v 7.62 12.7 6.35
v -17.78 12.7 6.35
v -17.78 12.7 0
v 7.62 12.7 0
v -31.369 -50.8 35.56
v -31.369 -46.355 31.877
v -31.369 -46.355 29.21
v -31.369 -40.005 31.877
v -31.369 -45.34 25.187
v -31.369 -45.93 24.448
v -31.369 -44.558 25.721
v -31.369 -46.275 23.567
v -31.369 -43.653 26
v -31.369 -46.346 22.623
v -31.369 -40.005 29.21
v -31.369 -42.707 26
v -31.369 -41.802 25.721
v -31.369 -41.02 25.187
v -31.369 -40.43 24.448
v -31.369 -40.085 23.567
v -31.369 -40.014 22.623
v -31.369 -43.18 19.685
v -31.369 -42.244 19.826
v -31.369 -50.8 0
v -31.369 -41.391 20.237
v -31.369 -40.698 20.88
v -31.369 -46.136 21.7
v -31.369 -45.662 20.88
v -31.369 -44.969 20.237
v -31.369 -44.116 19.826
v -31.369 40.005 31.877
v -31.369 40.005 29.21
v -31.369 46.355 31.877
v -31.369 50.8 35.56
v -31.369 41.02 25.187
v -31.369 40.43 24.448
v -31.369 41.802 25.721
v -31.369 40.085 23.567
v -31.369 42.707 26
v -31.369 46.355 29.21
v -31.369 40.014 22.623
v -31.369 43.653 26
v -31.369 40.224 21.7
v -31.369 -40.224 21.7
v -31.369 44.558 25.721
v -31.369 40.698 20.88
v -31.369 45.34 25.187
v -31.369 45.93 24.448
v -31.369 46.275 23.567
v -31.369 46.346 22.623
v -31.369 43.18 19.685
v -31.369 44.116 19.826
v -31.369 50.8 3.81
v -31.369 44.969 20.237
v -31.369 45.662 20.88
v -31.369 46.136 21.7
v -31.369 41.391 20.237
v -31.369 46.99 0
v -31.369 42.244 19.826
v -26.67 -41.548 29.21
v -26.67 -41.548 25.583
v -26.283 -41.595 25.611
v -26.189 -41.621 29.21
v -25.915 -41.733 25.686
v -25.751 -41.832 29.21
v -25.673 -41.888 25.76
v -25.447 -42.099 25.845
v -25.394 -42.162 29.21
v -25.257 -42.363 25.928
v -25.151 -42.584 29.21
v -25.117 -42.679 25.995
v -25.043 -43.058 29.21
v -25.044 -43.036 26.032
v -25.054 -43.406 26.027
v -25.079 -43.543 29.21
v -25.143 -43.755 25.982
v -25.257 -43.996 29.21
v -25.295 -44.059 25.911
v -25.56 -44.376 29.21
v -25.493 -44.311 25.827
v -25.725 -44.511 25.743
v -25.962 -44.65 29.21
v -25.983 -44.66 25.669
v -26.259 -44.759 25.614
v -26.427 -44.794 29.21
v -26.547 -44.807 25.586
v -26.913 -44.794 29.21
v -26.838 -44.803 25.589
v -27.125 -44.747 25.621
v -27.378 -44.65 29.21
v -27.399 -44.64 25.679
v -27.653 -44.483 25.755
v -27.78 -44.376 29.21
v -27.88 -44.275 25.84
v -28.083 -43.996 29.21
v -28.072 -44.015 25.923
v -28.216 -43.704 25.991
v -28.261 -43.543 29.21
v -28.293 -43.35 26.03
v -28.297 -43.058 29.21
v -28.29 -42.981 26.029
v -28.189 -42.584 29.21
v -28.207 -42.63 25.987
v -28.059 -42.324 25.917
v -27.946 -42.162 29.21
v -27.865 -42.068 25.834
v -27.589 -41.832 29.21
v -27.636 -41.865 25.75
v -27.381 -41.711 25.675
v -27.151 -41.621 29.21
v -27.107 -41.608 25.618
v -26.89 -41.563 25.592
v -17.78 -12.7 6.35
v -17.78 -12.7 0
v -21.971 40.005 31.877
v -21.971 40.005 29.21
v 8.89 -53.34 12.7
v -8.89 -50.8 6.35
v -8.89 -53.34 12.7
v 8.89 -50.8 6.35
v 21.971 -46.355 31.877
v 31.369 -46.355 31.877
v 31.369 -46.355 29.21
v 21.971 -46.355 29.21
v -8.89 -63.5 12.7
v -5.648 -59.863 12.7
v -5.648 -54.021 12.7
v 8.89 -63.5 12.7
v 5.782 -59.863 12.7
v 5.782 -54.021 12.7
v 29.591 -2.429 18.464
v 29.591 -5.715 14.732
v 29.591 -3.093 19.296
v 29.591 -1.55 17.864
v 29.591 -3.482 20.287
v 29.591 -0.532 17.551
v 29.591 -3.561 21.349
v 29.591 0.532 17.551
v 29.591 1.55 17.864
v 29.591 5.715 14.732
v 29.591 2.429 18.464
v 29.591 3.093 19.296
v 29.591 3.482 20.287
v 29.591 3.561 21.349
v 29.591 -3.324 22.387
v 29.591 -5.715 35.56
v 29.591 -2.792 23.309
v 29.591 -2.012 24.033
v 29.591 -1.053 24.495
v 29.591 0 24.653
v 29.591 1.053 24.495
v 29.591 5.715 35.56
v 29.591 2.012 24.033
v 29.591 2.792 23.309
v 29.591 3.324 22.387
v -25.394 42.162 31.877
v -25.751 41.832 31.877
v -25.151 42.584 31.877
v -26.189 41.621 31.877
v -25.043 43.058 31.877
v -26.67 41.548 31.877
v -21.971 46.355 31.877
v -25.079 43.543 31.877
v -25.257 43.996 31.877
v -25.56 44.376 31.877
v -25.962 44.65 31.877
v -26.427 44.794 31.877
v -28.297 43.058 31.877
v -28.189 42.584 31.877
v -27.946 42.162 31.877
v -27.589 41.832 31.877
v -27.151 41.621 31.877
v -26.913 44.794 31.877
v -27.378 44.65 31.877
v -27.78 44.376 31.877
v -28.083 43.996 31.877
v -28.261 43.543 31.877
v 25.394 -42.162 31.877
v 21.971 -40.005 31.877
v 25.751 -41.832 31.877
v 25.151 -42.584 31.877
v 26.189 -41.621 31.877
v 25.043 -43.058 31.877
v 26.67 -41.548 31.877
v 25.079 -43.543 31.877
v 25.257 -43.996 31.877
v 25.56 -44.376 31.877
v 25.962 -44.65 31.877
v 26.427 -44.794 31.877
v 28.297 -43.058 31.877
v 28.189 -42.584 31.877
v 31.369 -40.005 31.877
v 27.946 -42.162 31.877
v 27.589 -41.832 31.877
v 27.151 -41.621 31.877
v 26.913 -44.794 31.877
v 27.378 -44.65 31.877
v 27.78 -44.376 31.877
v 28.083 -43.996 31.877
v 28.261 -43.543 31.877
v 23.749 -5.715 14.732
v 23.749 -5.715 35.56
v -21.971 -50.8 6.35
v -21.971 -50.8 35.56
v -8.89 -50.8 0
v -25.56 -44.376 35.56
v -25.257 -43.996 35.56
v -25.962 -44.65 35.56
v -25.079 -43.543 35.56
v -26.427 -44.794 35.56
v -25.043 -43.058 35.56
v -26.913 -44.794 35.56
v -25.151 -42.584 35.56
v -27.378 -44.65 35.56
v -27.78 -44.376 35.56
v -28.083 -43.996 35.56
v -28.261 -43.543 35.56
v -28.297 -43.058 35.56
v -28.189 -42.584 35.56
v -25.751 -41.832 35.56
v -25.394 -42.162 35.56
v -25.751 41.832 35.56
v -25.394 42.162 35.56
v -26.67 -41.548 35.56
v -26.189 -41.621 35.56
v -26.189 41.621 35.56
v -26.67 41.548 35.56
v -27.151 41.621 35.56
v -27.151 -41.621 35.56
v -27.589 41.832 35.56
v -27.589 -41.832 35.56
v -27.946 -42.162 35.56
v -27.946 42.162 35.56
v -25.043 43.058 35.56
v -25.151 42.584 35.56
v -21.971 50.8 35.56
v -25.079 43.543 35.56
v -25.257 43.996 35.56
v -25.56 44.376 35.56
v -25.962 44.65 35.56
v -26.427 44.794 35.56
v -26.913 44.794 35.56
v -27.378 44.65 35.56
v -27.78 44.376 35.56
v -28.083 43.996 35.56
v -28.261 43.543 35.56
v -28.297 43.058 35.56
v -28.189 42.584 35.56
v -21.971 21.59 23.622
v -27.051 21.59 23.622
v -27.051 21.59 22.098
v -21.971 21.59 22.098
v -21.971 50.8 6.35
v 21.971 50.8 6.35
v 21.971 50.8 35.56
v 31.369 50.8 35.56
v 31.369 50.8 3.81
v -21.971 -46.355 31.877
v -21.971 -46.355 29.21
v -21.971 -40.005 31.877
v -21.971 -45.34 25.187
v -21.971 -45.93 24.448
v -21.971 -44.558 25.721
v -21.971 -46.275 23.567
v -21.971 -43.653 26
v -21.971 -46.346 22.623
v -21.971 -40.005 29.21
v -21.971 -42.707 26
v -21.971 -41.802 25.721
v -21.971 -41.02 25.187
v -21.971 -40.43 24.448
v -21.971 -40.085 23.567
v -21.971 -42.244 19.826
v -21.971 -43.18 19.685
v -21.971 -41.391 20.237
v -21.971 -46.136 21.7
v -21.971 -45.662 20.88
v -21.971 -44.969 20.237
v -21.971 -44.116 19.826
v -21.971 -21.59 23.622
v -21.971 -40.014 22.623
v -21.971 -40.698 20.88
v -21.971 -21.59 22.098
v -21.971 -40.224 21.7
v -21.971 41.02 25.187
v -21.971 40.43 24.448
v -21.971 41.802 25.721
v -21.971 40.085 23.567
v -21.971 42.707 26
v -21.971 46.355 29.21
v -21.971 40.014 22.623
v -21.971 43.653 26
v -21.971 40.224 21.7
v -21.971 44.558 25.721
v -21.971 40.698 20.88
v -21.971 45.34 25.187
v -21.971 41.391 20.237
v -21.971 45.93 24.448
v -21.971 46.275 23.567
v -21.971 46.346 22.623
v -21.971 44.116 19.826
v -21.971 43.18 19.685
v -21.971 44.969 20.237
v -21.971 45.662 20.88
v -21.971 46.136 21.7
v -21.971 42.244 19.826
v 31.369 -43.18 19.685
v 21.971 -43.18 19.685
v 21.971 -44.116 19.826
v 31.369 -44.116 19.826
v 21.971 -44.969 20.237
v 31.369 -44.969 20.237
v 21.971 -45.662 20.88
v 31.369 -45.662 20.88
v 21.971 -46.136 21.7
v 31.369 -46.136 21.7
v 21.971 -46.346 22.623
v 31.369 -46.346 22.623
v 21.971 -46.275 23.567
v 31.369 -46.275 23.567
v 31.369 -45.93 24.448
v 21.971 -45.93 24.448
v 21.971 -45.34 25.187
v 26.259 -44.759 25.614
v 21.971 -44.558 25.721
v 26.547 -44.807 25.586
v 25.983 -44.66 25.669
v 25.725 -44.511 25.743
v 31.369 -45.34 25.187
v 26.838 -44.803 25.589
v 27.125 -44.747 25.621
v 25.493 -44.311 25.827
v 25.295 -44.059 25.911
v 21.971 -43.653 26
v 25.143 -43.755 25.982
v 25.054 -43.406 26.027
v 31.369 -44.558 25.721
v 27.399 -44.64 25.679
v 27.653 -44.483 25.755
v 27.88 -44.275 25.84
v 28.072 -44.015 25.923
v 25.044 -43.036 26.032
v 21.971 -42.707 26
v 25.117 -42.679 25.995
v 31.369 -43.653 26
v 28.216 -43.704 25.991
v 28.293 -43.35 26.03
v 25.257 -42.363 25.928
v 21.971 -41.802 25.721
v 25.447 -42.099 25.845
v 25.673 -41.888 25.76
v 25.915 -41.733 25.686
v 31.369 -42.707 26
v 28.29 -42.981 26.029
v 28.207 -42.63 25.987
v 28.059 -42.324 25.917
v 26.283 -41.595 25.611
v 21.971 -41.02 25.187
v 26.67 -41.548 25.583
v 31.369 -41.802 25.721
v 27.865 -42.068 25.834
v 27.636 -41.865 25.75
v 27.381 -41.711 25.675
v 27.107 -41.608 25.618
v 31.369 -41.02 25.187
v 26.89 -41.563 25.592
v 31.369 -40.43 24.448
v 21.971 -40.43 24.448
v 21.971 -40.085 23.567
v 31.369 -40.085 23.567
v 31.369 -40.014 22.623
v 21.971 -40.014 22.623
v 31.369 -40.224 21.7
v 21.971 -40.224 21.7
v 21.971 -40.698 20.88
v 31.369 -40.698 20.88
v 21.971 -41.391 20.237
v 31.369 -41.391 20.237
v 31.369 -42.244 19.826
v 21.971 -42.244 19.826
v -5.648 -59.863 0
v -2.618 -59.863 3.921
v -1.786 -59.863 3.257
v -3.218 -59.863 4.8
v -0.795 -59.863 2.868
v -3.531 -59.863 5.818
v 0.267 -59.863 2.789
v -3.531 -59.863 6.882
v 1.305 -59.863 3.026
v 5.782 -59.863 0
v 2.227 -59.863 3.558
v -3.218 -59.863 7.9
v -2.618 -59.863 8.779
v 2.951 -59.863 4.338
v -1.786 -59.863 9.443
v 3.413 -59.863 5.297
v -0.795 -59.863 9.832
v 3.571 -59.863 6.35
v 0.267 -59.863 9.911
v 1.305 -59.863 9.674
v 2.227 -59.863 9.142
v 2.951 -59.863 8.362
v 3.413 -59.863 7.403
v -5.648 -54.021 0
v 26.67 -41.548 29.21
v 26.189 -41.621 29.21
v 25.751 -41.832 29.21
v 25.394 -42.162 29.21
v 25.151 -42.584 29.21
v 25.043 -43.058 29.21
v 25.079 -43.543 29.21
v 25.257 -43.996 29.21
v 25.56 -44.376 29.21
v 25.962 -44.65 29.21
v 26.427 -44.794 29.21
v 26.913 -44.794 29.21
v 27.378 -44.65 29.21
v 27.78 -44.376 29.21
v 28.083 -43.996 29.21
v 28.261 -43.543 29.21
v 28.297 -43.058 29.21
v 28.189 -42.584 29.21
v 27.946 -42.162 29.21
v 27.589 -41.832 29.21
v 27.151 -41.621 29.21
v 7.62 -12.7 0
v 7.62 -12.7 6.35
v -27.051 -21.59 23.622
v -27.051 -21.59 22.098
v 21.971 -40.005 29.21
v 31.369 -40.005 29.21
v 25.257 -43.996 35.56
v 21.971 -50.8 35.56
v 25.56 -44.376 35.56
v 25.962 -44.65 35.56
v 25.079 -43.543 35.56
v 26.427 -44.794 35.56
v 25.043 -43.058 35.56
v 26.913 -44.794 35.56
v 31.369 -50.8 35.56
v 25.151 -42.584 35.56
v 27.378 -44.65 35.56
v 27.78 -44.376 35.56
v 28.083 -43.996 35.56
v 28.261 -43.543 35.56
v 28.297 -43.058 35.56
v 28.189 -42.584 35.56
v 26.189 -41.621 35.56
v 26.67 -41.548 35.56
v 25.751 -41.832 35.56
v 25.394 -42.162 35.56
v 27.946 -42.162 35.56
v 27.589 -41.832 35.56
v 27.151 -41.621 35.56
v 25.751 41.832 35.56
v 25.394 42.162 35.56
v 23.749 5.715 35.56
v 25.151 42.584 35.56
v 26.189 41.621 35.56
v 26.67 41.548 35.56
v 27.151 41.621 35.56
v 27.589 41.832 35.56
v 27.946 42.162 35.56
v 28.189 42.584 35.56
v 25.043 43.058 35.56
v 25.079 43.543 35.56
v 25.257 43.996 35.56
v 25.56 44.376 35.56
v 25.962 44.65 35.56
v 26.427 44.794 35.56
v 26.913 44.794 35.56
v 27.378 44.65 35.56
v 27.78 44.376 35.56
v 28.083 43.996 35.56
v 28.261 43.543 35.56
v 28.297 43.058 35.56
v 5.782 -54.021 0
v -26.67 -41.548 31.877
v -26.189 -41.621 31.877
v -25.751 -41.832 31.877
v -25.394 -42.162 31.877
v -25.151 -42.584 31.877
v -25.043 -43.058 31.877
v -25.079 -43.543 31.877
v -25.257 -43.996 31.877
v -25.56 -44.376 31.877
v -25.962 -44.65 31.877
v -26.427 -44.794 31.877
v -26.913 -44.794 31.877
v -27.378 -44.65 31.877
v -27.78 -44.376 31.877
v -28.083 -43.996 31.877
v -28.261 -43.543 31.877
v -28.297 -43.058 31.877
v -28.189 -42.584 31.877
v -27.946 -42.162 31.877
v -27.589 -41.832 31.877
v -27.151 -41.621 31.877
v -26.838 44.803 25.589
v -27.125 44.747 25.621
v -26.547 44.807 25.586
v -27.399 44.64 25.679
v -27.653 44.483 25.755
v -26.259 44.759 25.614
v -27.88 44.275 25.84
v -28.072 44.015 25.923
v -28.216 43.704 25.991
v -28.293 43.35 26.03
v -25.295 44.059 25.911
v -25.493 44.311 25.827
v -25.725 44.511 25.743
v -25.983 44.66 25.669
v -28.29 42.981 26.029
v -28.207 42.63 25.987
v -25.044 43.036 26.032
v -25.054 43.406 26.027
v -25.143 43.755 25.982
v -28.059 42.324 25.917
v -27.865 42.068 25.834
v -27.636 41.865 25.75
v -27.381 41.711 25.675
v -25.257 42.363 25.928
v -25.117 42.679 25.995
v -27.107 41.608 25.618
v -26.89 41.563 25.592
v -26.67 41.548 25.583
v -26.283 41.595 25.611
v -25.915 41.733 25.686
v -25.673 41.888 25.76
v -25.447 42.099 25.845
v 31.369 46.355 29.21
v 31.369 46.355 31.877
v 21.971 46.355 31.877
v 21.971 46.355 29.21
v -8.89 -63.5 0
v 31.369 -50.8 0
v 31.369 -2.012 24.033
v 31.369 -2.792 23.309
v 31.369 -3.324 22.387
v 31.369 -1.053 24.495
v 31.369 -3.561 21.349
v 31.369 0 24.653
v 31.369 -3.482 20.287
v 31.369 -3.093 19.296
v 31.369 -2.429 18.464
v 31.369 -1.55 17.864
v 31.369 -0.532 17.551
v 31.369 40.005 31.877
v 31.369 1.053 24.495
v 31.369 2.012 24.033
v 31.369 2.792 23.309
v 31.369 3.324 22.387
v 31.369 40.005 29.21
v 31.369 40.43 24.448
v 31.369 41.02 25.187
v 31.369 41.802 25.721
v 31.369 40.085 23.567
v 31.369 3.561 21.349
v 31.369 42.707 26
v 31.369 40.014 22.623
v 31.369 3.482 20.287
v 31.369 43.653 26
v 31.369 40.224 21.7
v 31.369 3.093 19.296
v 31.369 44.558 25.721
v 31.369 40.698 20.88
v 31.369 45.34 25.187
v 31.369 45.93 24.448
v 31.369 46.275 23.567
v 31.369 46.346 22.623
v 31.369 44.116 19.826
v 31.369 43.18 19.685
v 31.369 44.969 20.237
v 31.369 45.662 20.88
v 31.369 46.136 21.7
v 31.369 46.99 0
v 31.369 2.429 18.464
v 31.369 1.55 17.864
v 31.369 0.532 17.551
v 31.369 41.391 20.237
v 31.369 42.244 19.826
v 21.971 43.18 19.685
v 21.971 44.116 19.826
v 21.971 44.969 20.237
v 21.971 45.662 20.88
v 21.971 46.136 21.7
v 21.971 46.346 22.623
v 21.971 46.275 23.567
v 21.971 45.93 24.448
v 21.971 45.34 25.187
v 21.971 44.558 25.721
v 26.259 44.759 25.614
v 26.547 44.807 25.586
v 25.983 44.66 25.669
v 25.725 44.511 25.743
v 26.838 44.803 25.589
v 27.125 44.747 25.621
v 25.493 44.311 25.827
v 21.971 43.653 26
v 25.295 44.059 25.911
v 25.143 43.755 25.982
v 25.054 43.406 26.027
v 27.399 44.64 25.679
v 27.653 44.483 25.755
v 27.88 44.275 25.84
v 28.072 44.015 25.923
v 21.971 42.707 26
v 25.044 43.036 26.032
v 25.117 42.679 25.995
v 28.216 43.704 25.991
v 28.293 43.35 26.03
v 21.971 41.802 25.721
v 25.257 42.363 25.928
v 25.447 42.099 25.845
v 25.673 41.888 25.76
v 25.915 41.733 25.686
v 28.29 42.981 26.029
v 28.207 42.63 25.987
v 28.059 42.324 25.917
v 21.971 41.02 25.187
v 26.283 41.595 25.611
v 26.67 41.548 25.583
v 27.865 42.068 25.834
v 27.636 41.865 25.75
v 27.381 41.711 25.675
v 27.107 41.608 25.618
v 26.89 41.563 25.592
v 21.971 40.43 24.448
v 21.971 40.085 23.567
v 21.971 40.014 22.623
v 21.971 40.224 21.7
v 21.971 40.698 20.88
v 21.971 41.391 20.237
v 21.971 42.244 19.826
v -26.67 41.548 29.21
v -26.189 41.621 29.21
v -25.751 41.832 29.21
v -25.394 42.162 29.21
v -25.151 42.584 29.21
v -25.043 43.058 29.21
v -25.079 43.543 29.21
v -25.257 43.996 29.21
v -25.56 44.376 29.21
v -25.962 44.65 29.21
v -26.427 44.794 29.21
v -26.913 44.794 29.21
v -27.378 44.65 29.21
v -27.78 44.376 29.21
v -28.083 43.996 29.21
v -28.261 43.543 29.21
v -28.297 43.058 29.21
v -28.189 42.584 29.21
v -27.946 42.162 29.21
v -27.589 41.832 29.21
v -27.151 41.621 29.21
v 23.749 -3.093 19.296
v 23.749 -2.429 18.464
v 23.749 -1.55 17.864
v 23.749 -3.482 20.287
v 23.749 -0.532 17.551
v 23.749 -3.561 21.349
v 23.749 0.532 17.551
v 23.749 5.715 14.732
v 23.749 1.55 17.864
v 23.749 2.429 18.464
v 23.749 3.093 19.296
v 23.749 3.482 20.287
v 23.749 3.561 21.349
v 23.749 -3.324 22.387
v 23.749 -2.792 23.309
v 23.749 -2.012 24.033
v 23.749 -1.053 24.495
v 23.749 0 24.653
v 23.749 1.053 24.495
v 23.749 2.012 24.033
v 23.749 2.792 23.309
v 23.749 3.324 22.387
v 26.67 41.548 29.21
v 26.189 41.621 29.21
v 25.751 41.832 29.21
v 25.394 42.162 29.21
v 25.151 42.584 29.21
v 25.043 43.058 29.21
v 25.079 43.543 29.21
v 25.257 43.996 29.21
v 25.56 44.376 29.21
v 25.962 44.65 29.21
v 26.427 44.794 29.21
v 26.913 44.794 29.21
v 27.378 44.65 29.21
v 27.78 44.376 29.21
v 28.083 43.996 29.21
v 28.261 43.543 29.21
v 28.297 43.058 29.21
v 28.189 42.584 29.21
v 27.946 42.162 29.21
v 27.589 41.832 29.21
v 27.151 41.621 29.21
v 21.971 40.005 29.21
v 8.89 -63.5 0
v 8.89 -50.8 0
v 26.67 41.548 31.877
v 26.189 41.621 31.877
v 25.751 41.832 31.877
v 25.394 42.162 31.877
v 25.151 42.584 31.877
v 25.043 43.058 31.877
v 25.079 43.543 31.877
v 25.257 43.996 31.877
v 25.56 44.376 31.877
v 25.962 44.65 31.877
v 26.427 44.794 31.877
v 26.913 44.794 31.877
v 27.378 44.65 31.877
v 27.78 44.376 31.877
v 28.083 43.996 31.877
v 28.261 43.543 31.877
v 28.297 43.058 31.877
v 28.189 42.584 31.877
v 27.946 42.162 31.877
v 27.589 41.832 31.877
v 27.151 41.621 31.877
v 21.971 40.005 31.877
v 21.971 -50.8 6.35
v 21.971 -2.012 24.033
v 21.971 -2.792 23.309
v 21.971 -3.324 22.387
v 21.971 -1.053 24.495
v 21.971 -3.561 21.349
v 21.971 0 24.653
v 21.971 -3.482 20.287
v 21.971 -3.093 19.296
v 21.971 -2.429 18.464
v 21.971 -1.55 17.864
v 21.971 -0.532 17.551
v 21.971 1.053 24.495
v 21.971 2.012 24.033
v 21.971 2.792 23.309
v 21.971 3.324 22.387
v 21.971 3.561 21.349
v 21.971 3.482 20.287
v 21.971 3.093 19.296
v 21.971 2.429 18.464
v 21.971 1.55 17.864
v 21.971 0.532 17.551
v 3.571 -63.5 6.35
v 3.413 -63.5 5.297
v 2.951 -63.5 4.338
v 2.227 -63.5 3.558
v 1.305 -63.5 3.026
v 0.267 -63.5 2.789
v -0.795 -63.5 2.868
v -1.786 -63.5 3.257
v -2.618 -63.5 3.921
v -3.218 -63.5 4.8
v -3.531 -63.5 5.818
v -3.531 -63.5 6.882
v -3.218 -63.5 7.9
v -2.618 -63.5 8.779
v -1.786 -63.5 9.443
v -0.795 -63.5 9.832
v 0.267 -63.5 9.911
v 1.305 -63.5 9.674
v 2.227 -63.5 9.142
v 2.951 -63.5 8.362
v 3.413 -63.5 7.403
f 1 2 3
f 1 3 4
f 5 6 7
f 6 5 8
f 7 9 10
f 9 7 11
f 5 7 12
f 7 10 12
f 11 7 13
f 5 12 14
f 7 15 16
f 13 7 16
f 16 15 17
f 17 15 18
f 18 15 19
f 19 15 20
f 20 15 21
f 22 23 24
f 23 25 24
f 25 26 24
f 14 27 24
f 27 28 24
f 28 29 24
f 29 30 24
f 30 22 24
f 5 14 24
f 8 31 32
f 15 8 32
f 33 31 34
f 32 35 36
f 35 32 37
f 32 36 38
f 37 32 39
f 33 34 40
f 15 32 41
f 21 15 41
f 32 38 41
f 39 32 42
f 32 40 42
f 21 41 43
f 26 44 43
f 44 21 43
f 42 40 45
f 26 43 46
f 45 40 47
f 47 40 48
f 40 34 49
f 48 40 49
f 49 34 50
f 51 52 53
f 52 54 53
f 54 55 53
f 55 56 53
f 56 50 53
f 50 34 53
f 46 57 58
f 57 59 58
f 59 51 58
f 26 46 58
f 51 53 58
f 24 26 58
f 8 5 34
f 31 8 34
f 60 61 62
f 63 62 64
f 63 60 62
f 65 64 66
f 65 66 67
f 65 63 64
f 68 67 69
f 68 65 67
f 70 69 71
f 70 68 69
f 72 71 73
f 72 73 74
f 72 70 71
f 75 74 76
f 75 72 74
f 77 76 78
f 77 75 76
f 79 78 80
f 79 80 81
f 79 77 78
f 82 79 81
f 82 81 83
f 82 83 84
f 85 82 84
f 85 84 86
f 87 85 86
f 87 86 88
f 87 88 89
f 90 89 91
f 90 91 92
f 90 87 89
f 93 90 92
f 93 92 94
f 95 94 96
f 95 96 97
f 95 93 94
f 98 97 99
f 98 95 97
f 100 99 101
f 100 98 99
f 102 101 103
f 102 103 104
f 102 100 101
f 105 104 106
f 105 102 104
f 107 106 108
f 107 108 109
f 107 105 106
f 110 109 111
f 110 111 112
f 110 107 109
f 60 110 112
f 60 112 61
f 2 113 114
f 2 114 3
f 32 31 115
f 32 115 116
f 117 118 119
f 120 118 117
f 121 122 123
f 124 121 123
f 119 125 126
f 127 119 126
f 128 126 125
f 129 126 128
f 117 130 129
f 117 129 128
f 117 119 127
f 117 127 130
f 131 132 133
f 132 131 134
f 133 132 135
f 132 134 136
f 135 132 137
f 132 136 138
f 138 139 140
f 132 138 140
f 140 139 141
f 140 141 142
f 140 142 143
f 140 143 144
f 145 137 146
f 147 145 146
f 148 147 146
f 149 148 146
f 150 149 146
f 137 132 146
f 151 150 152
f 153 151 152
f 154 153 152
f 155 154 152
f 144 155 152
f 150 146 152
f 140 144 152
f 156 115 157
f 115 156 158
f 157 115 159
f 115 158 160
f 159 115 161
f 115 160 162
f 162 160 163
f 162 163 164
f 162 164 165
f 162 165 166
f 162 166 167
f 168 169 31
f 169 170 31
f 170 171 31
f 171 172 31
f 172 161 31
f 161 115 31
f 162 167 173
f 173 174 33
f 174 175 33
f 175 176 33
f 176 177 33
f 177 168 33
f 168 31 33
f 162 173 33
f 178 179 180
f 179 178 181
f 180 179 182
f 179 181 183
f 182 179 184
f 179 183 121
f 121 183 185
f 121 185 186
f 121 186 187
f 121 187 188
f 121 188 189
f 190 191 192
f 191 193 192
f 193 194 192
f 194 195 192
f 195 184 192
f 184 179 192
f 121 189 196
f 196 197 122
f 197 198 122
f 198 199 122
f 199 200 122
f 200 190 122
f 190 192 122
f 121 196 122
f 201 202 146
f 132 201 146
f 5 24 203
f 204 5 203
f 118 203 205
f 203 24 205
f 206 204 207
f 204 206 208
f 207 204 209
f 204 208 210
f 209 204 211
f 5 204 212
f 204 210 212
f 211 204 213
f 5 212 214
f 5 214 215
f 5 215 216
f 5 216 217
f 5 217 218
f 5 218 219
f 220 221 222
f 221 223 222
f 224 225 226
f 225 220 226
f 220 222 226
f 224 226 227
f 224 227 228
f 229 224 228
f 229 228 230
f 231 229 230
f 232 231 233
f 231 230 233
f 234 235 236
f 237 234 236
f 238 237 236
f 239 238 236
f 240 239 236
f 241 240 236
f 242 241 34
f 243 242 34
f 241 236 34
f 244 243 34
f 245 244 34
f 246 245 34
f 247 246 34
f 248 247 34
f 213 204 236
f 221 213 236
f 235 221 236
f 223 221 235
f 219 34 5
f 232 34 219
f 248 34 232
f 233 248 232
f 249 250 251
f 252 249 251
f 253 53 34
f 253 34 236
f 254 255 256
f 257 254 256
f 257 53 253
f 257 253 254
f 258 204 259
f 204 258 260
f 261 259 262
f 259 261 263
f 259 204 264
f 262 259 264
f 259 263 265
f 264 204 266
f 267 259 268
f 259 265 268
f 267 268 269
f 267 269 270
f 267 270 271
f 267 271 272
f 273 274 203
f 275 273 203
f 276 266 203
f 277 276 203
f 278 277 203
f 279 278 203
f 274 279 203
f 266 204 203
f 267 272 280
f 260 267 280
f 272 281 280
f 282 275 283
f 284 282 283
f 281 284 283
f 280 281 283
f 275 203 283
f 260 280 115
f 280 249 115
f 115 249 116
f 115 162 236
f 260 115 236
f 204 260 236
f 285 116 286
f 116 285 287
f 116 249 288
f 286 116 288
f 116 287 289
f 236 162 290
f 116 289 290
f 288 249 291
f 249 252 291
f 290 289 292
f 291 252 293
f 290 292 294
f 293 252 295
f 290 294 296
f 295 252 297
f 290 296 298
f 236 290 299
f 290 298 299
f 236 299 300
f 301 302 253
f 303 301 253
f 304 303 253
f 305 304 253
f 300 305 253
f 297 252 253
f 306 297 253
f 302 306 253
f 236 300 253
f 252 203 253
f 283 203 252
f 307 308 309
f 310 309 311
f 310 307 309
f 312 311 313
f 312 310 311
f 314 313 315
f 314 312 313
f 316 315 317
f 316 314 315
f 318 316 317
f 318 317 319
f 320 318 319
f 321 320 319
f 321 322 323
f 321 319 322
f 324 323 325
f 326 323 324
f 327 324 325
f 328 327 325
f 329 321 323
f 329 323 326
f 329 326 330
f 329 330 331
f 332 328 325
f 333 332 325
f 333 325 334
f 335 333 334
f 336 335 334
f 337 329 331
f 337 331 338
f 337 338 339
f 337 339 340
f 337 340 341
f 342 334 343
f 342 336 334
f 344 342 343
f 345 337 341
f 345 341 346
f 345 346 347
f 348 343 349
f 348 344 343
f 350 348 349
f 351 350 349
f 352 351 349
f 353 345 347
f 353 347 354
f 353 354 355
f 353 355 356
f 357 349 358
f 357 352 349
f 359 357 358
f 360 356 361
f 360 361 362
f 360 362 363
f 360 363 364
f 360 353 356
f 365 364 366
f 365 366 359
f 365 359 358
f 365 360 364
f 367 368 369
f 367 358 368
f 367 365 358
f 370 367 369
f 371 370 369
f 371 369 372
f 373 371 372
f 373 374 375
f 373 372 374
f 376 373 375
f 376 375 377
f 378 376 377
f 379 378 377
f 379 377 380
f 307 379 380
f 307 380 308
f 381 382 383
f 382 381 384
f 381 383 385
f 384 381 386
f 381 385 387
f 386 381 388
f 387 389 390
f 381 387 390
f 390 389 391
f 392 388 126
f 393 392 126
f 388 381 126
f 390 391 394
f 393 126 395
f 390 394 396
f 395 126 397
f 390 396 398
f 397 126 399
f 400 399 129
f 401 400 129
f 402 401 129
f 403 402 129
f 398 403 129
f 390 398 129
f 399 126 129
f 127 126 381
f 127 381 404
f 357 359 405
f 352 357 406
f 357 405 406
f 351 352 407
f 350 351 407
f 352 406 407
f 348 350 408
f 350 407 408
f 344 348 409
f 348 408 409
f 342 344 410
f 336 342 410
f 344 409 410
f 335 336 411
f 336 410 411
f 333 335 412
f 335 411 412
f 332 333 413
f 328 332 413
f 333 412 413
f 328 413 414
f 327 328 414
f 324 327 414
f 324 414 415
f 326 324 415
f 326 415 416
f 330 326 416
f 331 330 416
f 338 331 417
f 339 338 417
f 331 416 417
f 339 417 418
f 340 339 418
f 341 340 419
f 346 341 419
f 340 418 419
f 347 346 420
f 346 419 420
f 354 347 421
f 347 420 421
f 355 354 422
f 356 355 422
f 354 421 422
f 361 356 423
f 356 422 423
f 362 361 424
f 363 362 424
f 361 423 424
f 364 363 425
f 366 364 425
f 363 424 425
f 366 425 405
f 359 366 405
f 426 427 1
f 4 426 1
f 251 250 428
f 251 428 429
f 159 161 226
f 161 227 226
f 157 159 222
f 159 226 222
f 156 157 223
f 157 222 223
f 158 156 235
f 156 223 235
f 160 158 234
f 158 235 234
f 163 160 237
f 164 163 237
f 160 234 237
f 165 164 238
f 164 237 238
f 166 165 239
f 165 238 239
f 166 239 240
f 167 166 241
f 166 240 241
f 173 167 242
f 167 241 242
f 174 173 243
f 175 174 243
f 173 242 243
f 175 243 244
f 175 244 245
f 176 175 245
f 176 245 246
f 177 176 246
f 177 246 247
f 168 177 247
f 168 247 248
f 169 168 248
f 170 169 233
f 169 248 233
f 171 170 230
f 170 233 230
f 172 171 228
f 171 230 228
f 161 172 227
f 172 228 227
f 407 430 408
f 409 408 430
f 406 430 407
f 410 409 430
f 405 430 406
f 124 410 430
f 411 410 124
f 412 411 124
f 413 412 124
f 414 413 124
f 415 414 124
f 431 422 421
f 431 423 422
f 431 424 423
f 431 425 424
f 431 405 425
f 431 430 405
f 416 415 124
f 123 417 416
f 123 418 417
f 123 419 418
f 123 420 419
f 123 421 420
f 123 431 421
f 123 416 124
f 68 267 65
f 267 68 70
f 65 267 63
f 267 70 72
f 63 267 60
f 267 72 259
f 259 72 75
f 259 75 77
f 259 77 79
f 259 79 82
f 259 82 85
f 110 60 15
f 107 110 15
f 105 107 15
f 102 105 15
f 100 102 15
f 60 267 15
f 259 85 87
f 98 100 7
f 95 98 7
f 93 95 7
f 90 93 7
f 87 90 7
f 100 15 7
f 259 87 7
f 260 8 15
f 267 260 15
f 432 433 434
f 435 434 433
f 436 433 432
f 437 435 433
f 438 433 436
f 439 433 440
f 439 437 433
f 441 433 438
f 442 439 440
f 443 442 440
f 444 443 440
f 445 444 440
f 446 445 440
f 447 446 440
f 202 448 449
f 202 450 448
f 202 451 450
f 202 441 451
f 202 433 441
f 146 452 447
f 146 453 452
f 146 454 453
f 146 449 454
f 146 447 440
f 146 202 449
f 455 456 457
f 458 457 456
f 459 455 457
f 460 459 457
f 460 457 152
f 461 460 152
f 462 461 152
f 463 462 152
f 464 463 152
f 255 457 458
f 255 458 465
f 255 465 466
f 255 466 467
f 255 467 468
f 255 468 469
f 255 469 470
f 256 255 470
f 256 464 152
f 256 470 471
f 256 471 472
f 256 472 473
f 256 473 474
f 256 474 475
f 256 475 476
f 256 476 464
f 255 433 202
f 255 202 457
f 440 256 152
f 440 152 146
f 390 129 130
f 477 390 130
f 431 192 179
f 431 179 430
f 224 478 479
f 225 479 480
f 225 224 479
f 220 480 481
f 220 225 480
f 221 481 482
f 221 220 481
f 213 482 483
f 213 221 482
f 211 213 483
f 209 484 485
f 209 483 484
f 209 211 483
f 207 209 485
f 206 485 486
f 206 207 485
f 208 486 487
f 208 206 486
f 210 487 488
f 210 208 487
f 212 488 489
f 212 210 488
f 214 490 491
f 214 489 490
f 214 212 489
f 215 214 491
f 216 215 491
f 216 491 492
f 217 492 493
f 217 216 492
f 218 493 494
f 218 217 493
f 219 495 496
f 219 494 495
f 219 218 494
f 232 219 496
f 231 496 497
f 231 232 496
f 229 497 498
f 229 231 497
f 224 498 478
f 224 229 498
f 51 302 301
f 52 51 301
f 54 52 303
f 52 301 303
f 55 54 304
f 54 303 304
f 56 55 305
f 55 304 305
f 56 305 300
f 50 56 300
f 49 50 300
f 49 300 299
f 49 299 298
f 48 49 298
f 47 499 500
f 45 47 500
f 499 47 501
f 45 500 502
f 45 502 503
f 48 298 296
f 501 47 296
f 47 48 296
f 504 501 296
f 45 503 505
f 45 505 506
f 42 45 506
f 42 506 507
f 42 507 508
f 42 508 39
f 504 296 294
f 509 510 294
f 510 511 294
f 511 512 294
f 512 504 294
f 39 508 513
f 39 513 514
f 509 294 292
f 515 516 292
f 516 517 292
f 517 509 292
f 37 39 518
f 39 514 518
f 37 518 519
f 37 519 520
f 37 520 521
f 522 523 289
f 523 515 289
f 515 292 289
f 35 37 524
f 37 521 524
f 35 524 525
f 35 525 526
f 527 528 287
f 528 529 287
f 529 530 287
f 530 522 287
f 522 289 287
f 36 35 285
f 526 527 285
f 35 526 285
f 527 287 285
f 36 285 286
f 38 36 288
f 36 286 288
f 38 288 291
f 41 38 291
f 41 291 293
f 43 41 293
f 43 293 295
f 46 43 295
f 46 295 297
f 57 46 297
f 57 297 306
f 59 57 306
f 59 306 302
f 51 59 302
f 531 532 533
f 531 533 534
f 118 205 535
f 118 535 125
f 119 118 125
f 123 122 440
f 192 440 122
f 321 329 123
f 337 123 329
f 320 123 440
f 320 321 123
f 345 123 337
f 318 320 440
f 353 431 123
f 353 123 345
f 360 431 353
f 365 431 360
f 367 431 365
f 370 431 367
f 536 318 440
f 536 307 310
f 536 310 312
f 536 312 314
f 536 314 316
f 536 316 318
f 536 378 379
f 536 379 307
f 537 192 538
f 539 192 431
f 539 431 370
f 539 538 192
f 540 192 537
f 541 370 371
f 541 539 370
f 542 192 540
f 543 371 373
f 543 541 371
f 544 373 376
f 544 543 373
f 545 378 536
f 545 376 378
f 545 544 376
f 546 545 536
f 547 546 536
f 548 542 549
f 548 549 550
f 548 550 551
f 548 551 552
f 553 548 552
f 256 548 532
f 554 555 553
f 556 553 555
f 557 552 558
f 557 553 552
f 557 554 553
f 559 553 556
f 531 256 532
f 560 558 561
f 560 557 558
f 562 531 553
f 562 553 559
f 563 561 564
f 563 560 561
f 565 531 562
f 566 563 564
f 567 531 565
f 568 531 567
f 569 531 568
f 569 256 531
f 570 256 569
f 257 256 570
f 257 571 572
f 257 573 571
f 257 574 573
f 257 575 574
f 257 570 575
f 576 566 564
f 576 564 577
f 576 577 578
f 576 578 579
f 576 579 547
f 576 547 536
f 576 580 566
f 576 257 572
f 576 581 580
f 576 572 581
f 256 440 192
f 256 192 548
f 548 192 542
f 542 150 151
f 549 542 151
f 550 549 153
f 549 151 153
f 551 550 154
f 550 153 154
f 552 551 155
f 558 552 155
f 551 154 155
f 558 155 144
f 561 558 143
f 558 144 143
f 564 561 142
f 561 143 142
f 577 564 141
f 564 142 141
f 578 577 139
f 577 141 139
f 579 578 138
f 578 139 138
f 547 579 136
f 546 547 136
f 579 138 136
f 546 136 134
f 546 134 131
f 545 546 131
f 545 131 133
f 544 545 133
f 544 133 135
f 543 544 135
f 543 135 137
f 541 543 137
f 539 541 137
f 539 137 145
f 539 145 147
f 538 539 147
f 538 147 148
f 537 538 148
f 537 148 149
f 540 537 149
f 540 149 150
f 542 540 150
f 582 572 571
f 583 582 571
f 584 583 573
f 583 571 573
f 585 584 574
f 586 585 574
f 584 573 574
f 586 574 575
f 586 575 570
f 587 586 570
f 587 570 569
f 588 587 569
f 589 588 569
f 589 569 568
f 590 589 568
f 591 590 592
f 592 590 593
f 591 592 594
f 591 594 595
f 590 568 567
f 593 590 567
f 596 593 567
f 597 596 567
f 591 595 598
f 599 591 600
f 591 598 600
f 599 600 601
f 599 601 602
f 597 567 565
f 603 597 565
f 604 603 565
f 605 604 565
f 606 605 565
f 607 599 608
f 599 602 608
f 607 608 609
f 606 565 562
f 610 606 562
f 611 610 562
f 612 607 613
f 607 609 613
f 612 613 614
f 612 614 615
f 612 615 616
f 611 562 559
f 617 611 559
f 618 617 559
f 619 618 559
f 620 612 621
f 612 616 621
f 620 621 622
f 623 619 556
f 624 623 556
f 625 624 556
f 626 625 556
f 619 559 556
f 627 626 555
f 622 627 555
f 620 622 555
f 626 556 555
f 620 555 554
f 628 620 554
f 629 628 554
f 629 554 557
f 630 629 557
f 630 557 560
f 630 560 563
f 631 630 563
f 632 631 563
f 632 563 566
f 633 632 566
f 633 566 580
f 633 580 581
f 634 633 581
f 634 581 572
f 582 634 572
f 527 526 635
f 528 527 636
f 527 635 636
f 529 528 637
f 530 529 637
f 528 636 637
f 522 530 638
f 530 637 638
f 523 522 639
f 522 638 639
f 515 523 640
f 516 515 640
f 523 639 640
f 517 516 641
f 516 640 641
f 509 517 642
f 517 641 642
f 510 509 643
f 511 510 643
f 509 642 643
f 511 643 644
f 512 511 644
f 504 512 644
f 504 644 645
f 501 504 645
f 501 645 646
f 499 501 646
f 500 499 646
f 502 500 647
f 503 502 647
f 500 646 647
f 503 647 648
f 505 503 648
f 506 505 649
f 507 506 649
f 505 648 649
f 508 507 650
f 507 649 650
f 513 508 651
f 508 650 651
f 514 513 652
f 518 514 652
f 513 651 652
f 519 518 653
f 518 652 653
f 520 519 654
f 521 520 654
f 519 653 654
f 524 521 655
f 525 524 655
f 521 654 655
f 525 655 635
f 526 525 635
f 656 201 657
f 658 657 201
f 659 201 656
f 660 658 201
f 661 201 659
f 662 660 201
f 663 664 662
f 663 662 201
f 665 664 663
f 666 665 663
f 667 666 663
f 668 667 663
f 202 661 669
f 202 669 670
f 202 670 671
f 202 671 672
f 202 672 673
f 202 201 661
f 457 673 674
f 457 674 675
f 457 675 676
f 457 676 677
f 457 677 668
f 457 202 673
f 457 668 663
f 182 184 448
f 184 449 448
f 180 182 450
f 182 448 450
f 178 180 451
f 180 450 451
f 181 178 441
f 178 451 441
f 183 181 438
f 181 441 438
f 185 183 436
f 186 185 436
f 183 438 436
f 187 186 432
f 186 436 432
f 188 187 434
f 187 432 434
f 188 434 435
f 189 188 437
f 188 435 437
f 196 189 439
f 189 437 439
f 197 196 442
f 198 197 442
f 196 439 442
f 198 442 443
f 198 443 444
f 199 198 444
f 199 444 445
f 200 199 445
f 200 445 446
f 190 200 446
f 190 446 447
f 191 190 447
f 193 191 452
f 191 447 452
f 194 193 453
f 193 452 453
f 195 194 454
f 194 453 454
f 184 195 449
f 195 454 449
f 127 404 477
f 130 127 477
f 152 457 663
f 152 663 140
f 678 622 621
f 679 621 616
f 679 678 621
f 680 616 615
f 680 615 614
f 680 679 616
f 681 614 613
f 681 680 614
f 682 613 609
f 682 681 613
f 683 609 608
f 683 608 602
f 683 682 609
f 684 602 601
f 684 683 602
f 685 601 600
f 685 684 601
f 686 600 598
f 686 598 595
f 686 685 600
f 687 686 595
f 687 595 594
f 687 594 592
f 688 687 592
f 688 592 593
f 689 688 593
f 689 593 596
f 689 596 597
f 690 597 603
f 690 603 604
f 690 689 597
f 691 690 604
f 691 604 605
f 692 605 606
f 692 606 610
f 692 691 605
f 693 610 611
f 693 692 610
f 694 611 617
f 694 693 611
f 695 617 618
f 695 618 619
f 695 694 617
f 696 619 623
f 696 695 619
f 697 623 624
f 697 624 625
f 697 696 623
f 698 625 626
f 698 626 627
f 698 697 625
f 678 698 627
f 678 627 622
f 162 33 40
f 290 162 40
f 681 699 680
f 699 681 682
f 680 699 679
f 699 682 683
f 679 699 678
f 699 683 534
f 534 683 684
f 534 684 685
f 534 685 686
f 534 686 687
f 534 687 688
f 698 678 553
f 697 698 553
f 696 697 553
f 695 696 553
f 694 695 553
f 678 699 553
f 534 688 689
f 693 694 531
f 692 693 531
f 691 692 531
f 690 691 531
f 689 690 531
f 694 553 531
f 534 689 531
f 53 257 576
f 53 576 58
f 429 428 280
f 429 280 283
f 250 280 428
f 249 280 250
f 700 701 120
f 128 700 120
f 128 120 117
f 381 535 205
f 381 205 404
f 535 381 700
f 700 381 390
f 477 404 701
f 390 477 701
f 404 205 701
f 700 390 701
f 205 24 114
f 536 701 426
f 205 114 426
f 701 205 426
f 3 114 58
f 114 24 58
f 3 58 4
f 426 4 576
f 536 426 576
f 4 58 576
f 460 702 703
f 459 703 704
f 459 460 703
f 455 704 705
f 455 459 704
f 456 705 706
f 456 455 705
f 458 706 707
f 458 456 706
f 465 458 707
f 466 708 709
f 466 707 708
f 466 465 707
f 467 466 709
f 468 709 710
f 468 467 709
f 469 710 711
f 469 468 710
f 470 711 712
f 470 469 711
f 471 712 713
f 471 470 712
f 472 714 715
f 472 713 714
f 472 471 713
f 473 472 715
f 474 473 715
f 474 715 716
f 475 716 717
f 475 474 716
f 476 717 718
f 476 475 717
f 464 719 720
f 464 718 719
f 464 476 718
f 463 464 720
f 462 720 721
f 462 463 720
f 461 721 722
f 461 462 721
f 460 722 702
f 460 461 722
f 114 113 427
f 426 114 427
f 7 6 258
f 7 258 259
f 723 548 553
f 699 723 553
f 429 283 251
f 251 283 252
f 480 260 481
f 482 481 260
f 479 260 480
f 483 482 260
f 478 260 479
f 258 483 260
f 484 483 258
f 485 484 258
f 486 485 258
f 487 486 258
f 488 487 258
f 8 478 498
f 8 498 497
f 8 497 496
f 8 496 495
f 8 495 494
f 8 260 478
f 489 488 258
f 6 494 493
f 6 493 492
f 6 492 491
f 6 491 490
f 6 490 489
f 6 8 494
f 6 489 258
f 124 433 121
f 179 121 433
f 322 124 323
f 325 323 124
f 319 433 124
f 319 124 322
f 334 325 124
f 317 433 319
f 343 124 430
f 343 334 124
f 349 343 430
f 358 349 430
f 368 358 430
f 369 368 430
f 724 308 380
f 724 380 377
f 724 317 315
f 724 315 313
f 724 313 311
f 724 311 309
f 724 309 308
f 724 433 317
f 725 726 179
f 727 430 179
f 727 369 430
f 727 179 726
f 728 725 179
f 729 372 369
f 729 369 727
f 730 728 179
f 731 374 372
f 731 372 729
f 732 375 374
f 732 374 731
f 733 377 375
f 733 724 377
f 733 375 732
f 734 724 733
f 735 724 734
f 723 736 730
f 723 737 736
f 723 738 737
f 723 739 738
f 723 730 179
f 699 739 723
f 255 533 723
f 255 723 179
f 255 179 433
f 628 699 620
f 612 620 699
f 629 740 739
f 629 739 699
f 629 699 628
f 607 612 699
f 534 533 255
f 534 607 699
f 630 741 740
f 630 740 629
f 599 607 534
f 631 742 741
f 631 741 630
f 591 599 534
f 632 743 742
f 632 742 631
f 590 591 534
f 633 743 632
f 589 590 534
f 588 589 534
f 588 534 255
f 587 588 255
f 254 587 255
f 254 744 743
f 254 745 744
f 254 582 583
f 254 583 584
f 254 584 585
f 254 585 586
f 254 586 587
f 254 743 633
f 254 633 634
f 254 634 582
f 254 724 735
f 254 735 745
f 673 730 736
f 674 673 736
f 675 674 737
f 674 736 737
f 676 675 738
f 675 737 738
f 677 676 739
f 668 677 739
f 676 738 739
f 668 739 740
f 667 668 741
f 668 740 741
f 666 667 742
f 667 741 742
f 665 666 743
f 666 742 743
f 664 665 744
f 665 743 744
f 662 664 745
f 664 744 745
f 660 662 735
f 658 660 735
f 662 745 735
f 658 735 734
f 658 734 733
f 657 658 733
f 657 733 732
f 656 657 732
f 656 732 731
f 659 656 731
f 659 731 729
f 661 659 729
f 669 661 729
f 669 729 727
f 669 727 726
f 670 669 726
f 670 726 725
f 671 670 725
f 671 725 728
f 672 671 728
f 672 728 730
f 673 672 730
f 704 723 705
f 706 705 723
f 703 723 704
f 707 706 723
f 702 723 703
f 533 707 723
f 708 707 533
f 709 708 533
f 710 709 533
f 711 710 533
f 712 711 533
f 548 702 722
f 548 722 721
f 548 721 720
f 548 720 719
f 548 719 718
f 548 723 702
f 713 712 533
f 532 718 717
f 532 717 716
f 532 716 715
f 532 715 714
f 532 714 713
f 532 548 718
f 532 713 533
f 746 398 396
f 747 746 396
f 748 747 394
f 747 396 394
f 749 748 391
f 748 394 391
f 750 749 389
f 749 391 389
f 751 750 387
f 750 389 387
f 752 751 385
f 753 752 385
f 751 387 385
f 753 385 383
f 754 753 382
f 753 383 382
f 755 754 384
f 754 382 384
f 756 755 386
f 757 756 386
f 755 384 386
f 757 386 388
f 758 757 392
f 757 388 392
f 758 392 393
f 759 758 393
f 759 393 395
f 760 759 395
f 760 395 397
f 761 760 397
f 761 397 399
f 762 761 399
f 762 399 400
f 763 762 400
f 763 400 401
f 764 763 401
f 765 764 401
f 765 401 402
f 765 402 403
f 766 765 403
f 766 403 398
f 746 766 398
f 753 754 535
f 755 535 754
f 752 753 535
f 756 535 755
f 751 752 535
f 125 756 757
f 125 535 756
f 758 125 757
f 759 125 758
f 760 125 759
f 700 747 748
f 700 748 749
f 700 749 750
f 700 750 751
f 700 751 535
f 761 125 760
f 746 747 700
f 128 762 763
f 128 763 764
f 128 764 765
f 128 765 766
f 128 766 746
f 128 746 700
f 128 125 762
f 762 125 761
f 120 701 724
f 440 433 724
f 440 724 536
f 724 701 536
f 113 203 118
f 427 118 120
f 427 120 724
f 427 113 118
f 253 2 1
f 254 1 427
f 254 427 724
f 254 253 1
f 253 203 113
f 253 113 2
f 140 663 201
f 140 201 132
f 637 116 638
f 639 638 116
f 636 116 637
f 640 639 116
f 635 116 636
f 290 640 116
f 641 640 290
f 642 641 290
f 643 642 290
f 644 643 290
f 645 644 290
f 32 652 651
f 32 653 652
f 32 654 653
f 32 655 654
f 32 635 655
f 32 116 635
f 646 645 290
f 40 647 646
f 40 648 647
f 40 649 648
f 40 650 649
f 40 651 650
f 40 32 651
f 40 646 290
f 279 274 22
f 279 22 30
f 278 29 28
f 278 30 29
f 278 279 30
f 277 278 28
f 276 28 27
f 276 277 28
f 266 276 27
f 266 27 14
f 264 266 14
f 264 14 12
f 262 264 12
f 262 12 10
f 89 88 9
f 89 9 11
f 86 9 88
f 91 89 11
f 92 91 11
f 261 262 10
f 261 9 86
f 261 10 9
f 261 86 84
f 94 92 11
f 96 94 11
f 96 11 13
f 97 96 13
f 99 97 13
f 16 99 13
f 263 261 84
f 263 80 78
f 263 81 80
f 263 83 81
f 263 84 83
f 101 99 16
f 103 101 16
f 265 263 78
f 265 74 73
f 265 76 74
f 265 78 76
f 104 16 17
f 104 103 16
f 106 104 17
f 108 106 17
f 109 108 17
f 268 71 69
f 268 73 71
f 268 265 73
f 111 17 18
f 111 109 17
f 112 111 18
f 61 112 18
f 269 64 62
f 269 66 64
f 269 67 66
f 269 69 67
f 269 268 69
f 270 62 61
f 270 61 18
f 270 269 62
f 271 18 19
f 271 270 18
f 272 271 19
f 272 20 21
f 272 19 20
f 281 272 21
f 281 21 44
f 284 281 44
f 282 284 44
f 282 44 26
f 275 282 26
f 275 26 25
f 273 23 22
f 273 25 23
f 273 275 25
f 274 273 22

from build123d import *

# Parameters (mm, degrees)
SKETCH1_W                   = 114.3
SKETCH1_H                   = 127
BOSS_EXTRUDE1_DEPTH         = 6.35
SKETCH2_W                   = 9.398
SKETCH2_H                   = 101.6
BOSS_EXTRUDE2_DEPTH         = 29.21
SKETCH10_R                  = 3.175
CUT_EXTRUDE1_DEPTH          = 115.596583549
SKETCH13_W                  = 2.667
SKETCH13_H                  = 6.35
CUT_EXTRUDE2_DEPTH          = 9.398
CUT_EXTRUDE3_REACH          = 92.286
SKETCH15_W                  = 25.4
SKETCH15_H                  = 25.4
MIRROR4_COPY_1_SKETCH_W     = 2.667
MIRROR4_COPY_1_SKETCH_H     = 6.35
MIRROR4_COPY_1_DEPTH        = 9.398
SKETCH19_W                  = 1.524
SKETCH19_H                  = 43.18
CUT_EXTRUDE4_DEPTH          = 5.08
SKETCH23_W                  = 5.842
SKETCH23_H                  = 11.43
CUT_EXTRUDE5_DEPTH          = 20.828
SKETCH24_W                  = 127.881325932
SKETCH24_H                  = 16.190143287
CUT_EXTRUDE6_DEPTH          = 12.7
SKETCH26_W                  = 20.33012471
SKETCH26_H                  = 111.91731712
CUT_EXTRUDE8_DEPTH          = 25.781
CHAMFER1_SIZE               = 3.81
SKETCH28_W                  = 17.78
SKETCH28_H                  = 12.7
BOSS_EXTRUDE3_DEPTH         = 12.7
SKETCH30_W                  = 11.43
SKETCH30_H                  = 5.842
CUT_EXTRUDE9_DEPTH          = 75.423408732
F_1_4_CLEARANCE_HOLE1_D     = 7.14248
F_1_4_CLEARANCE_HOLE1_DEPTH = 3.636839777
CHAMFER3_SIZE2              = 6.35
CHAMFER3_SIZE               = 2.54
F_1_4_CLEARANCE_HOLE2_D     = 7.14248
F_1_4_CLEARANCE_HOLE2_DEPTH = 15.24


with BuildPart() as part:
    # Sketch1 → Boss-Extrude1 (new body)
    with BuildSketch(Plane.XY):
        Rectangle(SKETCH1_W, SKETCH1_H)
    extrude(amount=BOSS_EXTRUDE1_DEPTH)

    # Sketch2 → Boss-Extrude2 (add)
    with BuildSketch(Plane.XY.offset(6.35)):
        with Locations((26.67, 0)):
            Rectangle(SKETCH2_W, SKETCH2_H)
    boss_extrude2 = extrude(amount=BOSS_EXTRUDE2_DEPTH)

    # Mirror1: Boss-Extrude2 across plane
    add(boss_extrude2.mirror(Plane(origin=(0, 0, 0), x_dir=(0, 0, 1), z_dir=(1, 0, 0))))

    # Sketch10 → Cut-Extrude1 (cut, through all)
    with BuildSketch(Plane(origin=(31.369, 0, 0), x_dir=(0, 0, -1), z_dir=(1, 0, 0))):
        with Locations((-22.86, 43.18)):
            Circle(SKETCH10_R)
    cut_extrude1 = extrude(amount=-CUT_EXTRUDE1_DEPTH, mode=Mode.SUBTRACT)

    # Mirror2: Cut-Extrude1 across plane
    add(cut_extrude1.mirror(Plane.ZX), mode=Mode.SUBTRACT)

    # Sketch13 → Cut-Extrude2 (cut)
    with BuildSketch(Plane(origin=(31.369, 0, 0), x_dir=(0, 0, -1), z_dir=(1, 0, 0))):
        with Locations((-30.5435, 43.18)):
            Rectangle(SKETCH13_W, SKETCH13_H)
    cut_extrude2 = extrude(amount=-CUT_EXTRUDE2_DEPTH, mode=Mode.SUBTRACT)

    # Sketch15 → Cut-Extrude3 (cut, up to next)
    with BuildSketch(Plane.XY.offset(6.35), mode=Mode.PRIVATE) as cut_extrude3_sk1:
        with Locations((-5.08, 0)):
            Rectangle(SKETCH15_W, SKETCH15_H)
    cut_extrude3_tool1 = extrude(cut_extrude3_sk1.sketch, amount=-CUT_EXTRUDE3_REACH, mode=Mode.PRIVATE) & part.part
    add(cut_extrude3_tool1.solids().sort_by_distance((-5.08, 0, 6.35))[0], mode=Mode.SUBTRACT)

    # Sketch16 → #4 Clearance Hole1 (revolve, cut)
    with BuildSketch(Plane(origin=(26.67, 43.18, 35.56), x_dir=(0, -1, 0), z_dir=(1, 0, 0))):
        Polygon((0, 0), (0, 12.918574487), (1.63195, 11.938), (1.63195, 0), align=None)
    f_4_clearance_hole1 = revolve(axis=Axis((26.67, 43.18, 41.91), (0, 0, -1)), mode=Mode.SUBTRACT)

    # Mirror3: Cut-Extrude2, #4 Clearance Hole1 across plane
    add(cut_extrude2.mirror(Plane(origin=(0, 0, 0), x_dir=(0, 0, 1), z_dir=(1, 0, 0))), mode=Mode.SUBTRACT)
    add(f_4_clearance_hole1.mirror(Plane(origin=(0, 0, 0), x_dir=(0, 0, 1), z_dir=(1, 0, 0))), mode=Mode.SUBTRACT)

    # Mirror4: Cut-Extrude2, #4 Clearance Hole1 across plane
    add(cut_extrude2.mirror(Plane.ZX), mode=Mode.SUBTRACT)
    add(f_4_clearance_hole1.mirror(Plane.ZX), mode=Mode.SUBTRACT)

    # Mirror4 copy 1 sketch → Mirror4 copy 1 (cut)
    with BuildSketch(Plane(origin=(-31.369, 0, 0), x_dir=(0, 0, -1), z_dir=(-1, 0, 0))):
        with Locations((-30.5435, 43.18)):
            Rectangle(MIRROR4_COPY_1_SKETCH_W, MIRROR4_COPY_1_SKETCH_H)
    extrude(amount=-MIRROR4_COPY_1_DEPTH, mode=Mode.SUBTRACT)

    # Mirror4 copy 2 sketch → Mirror4 copy 2 (revolve, cut)
    with BuildSketch(Plane(origin=(-26.67, -43.18, 35.56), x_dir=(0, 1, 0), z_dir=(-1, 0, 0))):
        Polygon((0, 0), (0, 12.918574487), (1.63195, 11.938), (1.63195, 0), align=None)
    revolve(axis=Axis((-26.67, -43.18, 41.91), (0, 0, -1)), mode=Mode.SUBTRACT)

    # Sketch19 → Cut-Extrude4 (cut)
    with BuildSketch(Plane(origin=(-21.971, 0, 0), x_dir=(0, 0, -1), z_dir=(1, 0, 0))):
        with Locations((-22.86, 0)):
            Rectangle(SKETCH19_W, SKETCH19_H)
    extrude(amount=-CUT_EXTRUDE4_DEPTH, mode=Mode.SUBTRACT)

    # Sketch23 → Cut-Extrude5 (cut)
    with BuildSketch(Plane.XY.offset(35.56)):
        with Locations((26.67, 0)):
            Rectangle(SKETCH23_W, SKETCH23_H)
    extrude(amount=-CUT_EXTRUDE5_DEPTH, mode=Mode.SUBTRACT)

    # Sketch24 → Cut-Extrude6 (cut)
    with BuildSketch(Plane(origin=(0, 63.5, 0), x_dir=(1, 0, 0), z_dir=(0, 1, 0))):
        with Locations((0, -3.427395894)):
            Rectangle(SKETCH24_W, SKETCH24_H)
    cut_extrude6 = extrude(amount=-CUT_EXTRUDE6_DEPTH, mode=Mode.SUBTRACT)

    # Mirror5: Cut-Extrude6 across plane
    add(cut_extrude6.mirror(Plane.ZX), mode=Mode.SUBTRACT)

    # Sketch26 → Cut-Extrude8 (cut)
    with BuildSketch(Plane(origin=(57.15, 0, 0), x_dir=(0, 0, -1), z_dir=(1, 0, 0))):
        with Locations((-3.366450344, 0)):
            Rectangle(SKETCH26_W, SKETCH26_H)
    cut_extrude8 = extrude(amount=-CUT_EXTRUDE8_DEPTH, mode=Mode.SUBTRACT)

    # Mirror6: Cut-Extrude8 across plane
    add(cut_extrude8.mirror(Plane(origin=(0, 0, 0), x_dir=(0, 0, 1), z_dir=(1, 0, 0))), mode=Mode.SUBTRACT)

    # Chamfer1
    chamfer1_edges = [part.edges().sort_by_distance(p)[0] for p in [
        (0, 50.8, 0),
    ]]
    chamfer(chamfer1_edges, length=CHAMFER1_SIZE)

    # Sketch28 → Boss-Extrude3 (add)
    with BuildSketch(Plane.XZ.offset(50.8)):
        with Locations((0, 6.35)):
            Rectangle(SKETCH28_W, SKETCH28_H)
    extrude(amount=BOSS_EXTRUDE3_DEPTH)

    # Sketch30 → Cut-Extrude9 (cut, through all)
    with BuildSketch(Plane.XY.offset(12.7)):
        with Locations((0.067049503, -56.942160223)):
            Rectangle(SKETCH30_W, SKETCH30_H)
    extrude(amount=-CUT_EXTRUDE9_DEPTH, mode=Mode.SUBTRACT)

    # 1/4 Clearance Hole1
    with Locations(Plane(origin=(0, -63.5, 0), x_dir=(-1, 0, 0), z_dir=(0, -1, 0))):
        with Locations((0, -6.35)):
            Hole(F_1_4_CLEARANCE_HOLE1_D / 2, depth=F_1_4_CLEARANCE_HOLE1_DEPTH)

    # Chamfer3
    chamfer3_edges = [part.edges().sort_by_distance(p)[0] for p in [
        (0, -50.8, 12.7),
    ]]
    chamfer3_side = [part.faces().sort_by_distance(p)[0] for p in [
        (0, -50.8508, 12.7),
    ]]
    chamfer(chamfer3_edges, length=CHAMFER3_SIZE - 0.0001, length2=CHAMFER3_SIZE2 - 0.0001, reference=chamfer3_side[0])  # a hair under: the kernel refuses the full size

    # 1/4 Clearance Hole2
    with Locations(Plane(origin=(31.369, 0, 0), x_dir=(0, 0, -1), z_dir=(1, 0, 0))):
        with Locations((-21.082, 0)):
            Hole(F_1_4_CLEARANCE_HOLE2_D / 2, depth=F_1_4_CLEARANCE_HOLE2_DEPTH)


solid = part.part
